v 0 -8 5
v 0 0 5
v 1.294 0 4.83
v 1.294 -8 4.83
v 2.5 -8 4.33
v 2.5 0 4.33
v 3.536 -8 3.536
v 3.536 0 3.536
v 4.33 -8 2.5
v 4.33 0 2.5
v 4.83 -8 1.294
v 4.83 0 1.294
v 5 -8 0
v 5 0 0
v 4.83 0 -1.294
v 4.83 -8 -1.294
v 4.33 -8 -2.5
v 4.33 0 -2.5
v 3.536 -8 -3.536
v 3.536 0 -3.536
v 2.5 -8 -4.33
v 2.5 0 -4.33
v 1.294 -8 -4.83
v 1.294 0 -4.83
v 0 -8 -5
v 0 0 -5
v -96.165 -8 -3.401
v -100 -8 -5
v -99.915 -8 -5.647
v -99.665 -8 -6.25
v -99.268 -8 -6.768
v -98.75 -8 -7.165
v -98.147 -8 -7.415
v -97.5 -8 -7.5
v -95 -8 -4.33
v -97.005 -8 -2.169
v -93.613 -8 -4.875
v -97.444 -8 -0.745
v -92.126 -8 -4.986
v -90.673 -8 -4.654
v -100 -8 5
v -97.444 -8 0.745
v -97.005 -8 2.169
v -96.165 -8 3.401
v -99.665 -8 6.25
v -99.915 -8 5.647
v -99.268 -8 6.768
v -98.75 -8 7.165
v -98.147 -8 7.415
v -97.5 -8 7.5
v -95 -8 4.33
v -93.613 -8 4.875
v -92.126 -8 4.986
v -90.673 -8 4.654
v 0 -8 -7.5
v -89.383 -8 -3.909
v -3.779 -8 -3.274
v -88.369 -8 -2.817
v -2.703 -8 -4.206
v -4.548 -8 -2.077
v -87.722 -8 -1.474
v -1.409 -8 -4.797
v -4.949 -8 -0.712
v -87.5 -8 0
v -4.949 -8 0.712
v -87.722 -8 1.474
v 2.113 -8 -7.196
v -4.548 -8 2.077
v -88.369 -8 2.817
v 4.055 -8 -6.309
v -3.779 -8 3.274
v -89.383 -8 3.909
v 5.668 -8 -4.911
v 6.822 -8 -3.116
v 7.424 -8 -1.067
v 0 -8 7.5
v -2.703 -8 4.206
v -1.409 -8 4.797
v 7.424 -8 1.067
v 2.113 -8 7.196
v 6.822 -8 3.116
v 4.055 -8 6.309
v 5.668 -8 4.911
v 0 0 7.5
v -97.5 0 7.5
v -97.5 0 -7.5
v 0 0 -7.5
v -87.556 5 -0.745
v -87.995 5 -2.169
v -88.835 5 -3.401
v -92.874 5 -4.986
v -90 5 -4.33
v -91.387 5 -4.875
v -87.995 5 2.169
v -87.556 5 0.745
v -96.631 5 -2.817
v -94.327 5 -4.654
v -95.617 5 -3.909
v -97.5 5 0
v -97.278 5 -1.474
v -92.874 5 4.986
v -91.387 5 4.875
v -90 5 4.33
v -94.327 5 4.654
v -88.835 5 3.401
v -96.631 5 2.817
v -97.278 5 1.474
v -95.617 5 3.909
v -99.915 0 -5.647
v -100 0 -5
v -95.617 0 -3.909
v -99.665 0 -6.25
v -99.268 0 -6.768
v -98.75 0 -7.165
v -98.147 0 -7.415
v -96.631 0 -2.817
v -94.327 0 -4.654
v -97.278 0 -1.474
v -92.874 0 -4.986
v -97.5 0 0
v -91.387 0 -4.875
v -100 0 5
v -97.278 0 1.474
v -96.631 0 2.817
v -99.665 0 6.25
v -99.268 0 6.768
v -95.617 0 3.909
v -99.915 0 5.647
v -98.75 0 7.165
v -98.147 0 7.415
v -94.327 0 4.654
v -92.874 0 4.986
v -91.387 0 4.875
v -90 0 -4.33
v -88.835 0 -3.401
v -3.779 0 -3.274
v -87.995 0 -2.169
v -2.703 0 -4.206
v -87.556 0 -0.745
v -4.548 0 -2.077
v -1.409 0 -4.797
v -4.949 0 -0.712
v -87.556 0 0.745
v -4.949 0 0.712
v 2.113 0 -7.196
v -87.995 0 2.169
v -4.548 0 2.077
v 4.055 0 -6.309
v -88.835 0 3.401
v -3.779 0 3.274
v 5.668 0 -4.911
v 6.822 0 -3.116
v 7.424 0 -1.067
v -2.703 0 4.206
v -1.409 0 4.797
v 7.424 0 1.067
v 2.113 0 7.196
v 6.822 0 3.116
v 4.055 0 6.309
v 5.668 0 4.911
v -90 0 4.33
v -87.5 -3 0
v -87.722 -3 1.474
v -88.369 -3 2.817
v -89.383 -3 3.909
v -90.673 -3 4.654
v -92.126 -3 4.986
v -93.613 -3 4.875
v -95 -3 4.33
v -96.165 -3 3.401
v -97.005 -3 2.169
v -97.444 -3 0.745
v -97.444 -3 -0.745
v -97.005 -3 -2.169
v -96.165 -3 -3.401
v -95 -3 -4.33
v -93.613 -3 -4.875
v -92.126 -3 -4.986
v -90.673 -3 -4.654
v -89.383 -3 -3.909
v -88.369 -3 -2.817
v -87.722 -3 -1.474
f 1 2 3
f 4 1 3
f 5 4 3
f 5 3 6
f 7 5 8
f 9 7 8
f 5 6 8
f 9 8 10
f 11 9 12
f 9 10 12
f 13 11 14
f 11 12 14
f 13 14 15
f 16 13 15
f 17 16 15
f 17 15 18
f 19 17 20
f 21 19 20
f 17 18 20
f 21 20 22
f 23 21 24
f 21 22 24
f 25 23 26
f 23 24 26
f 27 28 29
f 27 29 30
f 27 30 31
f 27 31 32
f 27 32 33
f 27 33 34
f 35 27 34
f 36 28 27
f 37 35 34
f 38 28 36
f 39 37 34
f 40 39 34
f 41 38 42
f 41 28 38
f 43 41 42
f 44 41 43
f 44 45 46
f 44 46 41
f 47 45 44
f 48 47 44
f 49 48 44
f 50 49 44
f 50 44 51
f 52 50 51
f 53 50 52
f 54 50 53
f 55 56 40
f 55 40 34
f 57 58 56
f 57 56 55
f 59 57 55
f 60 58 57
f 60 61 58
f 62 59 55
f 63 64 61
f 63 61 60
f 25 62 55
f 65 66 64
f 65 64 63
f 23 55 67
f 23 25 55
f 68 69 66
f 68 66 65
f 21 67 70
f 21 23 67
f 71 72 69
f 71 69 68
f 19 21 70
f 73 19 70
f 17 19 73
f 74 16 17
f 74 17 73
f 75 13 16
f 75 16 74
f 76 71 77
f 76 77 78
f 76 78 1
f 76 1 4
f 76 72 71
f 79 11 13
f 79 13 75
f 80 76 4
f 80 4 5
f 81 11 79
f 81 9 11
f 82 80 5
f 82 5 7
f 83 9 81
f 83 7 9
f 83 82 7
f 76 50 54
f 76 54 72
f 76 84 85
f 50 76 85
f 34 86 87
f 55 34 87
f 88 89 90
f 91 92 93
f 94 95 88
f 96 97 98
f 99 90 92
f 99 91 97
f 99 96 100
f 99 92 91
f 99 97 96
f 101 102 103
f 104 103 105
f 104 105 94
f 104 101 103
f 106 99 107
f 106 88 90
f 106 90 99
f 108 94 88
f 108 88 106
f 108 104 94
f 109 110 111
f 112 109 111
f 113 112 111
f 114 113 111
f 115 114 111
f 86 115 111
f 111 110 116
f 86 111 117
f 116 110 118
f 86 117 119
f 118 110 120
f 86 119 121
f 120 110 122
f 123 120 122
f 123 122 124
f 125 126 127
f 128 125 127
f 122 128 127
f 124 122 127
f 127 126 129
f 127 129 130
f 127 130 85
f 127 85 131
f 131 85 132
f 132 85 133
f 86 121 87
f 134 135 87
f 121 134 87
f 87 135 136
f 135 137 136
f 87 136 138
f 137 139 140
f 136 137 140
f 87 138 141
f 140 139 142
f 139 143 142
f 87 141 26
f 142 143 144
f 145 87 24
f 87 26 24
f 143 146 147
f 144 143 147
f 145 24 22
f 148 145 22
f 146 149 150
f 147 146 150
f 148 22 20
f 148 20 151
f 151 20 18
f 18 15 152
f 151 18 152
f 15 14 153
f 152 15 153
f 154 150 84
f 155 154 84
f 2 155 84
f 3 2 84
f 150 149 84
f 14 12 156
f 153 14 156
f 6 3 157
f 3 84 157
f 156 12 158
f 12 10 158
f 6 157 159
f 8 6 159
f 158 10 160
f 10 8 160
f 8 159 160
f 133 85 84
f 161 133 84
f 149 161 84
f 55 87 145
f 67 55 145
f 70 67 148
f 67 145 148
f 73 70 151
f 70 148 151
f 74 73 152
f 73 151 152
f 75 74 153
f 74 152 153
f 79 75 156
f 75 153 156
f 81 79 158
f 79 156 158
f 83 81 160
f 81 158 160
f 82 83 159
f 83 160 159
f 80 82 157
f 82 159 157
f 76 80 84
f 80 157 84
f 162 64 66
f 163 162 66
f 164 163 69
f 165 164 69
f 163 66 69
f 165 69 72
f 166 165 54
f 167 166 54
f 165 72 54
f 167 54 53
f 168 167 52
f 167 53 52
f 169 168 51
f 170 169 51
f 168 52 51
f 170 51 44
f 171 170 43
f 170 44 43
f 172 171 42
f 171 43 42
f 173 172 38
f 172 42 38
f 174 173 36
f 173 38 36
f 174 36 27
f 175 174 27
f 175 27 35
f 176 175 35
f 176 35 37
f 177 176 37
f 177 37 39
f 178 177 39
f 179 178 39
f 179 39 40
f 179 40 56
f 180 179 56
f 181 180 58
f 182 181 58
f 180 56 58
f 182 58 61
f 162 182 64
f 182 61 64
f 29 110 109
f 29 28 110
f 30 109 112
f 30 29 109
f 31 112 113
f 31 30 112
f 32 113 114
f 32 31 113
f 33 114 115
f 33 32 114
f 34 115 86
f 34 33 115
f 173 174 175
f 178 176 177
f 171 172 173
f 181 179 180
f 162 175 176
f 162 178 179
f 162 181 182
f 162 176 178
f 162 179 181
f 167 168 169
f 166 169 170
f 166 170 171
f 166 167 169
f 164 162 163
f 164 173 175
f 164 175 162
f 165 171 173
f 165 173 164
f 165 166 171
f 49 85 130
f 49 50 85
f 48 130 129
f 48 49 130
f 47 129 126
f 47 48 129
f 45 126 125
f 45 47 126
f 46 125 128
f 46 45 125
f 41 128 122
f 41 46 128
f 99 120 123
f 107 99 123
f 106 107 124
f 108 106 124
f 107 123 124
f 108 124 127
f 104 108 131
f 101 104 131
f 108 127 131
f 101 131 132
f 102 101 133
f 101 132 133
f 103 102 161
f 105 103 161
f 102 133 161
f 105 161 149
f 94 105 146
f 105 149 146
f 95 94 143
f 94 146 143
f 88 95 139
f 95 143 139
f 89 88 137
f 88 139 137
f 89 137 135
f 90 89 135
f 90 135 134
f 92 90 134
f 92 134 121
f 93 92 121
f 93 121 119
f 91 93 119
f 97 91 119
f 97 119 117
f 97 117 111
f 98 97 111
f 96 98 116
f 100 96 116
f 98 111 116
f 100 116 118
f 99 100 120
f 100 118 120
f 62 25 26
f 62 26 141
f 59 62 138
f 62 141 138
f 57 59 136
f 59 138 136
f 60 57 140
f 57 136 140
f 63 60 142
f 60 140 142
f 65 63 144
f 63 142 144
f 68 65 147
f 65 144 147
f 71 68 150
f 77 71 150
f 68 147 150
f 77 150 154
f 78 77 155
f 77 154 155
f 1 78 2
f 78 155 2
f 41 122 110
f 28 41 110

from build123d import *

# Parameters (mm, degrees)
F1_DEPTH = 8
F2_R     = 2.5
F3_R     = 5
F4_DEPTH = 5
F5_R     = 5
F6_DEPTH = 5


# Not quite as in the source:
# - a feature names something its author has since deleted; it is built from what else it names


with BuildPart() as f1:
    # F0 (on Front) → F1 (new body)
    with BuildSketch(Plane.XZ):
        with BuildLine():
            ThreePointArc((0, -7.5), (-7.5, 0), (0, 7.5))
            Line((0, 7.5), (-100, 7.5))
            Line((-100, 7.5), (-100, -7.5))
            Line((-100, -7.5), (0, -7.5))
        make_face()
        with BuildLine():
            Line((0, 5), (0, 7.5))
            ThreePointArc((0, 7.5), (-7.5, 0), (0, -7.5))
            Line((0, -7.5), (0, -5))
            ThreePointArc((0, -5), (-5, 0), (0, 5))
        make_face()
        with BuildLine():
            ThreePointArc((0, -7.5), (5.3033008589, -5.3033008589), (7.5, 0))
            ThreePointArc((7.5, 0), (5.3033008589, 5.3033008589), (0, 7.5))
            Line((0, 7.5), (0, 5))
            ThreePointArc((0, 5), (3.5355339059, 3.5355339059), (5, 0))
            ThreePointArc((5, 0), (3.5355339059, -3.5355339059), (0, -5))
            Line((0, -5), (0, -7.5))
        make_face()
    extrude(amount=F1_DEPTH)

    # F2
    f2_edges = [f1.edges().sort_by_distance(p)[0] for p in [
        (-100, -4, 7.5),
        (-100, -4, -7.5),
    ]]
    fillet(f2_edges, radius=F2_R)

    # F3 (on face) → F4 (join)
    with BuildSketch(Plane(origin=(0, 0, 0), x_dir=(-1, 0, 0), z_dir=(0, 1, 0))):
        with Locations((92.5, 0)):
            Circle(F3_R)
    extrude(amount=F4_DEPTH)

    # F5 (on face) → F6 (cut)
    with BuildSketch(Plane.XZ.offset(8)):
        with Locations((-92.5, 0)):
            Circle(F5_R)
    extrude(amount=-F6_DEPTH, mode=Mode.SUBTRACT)


solid = f1.part
